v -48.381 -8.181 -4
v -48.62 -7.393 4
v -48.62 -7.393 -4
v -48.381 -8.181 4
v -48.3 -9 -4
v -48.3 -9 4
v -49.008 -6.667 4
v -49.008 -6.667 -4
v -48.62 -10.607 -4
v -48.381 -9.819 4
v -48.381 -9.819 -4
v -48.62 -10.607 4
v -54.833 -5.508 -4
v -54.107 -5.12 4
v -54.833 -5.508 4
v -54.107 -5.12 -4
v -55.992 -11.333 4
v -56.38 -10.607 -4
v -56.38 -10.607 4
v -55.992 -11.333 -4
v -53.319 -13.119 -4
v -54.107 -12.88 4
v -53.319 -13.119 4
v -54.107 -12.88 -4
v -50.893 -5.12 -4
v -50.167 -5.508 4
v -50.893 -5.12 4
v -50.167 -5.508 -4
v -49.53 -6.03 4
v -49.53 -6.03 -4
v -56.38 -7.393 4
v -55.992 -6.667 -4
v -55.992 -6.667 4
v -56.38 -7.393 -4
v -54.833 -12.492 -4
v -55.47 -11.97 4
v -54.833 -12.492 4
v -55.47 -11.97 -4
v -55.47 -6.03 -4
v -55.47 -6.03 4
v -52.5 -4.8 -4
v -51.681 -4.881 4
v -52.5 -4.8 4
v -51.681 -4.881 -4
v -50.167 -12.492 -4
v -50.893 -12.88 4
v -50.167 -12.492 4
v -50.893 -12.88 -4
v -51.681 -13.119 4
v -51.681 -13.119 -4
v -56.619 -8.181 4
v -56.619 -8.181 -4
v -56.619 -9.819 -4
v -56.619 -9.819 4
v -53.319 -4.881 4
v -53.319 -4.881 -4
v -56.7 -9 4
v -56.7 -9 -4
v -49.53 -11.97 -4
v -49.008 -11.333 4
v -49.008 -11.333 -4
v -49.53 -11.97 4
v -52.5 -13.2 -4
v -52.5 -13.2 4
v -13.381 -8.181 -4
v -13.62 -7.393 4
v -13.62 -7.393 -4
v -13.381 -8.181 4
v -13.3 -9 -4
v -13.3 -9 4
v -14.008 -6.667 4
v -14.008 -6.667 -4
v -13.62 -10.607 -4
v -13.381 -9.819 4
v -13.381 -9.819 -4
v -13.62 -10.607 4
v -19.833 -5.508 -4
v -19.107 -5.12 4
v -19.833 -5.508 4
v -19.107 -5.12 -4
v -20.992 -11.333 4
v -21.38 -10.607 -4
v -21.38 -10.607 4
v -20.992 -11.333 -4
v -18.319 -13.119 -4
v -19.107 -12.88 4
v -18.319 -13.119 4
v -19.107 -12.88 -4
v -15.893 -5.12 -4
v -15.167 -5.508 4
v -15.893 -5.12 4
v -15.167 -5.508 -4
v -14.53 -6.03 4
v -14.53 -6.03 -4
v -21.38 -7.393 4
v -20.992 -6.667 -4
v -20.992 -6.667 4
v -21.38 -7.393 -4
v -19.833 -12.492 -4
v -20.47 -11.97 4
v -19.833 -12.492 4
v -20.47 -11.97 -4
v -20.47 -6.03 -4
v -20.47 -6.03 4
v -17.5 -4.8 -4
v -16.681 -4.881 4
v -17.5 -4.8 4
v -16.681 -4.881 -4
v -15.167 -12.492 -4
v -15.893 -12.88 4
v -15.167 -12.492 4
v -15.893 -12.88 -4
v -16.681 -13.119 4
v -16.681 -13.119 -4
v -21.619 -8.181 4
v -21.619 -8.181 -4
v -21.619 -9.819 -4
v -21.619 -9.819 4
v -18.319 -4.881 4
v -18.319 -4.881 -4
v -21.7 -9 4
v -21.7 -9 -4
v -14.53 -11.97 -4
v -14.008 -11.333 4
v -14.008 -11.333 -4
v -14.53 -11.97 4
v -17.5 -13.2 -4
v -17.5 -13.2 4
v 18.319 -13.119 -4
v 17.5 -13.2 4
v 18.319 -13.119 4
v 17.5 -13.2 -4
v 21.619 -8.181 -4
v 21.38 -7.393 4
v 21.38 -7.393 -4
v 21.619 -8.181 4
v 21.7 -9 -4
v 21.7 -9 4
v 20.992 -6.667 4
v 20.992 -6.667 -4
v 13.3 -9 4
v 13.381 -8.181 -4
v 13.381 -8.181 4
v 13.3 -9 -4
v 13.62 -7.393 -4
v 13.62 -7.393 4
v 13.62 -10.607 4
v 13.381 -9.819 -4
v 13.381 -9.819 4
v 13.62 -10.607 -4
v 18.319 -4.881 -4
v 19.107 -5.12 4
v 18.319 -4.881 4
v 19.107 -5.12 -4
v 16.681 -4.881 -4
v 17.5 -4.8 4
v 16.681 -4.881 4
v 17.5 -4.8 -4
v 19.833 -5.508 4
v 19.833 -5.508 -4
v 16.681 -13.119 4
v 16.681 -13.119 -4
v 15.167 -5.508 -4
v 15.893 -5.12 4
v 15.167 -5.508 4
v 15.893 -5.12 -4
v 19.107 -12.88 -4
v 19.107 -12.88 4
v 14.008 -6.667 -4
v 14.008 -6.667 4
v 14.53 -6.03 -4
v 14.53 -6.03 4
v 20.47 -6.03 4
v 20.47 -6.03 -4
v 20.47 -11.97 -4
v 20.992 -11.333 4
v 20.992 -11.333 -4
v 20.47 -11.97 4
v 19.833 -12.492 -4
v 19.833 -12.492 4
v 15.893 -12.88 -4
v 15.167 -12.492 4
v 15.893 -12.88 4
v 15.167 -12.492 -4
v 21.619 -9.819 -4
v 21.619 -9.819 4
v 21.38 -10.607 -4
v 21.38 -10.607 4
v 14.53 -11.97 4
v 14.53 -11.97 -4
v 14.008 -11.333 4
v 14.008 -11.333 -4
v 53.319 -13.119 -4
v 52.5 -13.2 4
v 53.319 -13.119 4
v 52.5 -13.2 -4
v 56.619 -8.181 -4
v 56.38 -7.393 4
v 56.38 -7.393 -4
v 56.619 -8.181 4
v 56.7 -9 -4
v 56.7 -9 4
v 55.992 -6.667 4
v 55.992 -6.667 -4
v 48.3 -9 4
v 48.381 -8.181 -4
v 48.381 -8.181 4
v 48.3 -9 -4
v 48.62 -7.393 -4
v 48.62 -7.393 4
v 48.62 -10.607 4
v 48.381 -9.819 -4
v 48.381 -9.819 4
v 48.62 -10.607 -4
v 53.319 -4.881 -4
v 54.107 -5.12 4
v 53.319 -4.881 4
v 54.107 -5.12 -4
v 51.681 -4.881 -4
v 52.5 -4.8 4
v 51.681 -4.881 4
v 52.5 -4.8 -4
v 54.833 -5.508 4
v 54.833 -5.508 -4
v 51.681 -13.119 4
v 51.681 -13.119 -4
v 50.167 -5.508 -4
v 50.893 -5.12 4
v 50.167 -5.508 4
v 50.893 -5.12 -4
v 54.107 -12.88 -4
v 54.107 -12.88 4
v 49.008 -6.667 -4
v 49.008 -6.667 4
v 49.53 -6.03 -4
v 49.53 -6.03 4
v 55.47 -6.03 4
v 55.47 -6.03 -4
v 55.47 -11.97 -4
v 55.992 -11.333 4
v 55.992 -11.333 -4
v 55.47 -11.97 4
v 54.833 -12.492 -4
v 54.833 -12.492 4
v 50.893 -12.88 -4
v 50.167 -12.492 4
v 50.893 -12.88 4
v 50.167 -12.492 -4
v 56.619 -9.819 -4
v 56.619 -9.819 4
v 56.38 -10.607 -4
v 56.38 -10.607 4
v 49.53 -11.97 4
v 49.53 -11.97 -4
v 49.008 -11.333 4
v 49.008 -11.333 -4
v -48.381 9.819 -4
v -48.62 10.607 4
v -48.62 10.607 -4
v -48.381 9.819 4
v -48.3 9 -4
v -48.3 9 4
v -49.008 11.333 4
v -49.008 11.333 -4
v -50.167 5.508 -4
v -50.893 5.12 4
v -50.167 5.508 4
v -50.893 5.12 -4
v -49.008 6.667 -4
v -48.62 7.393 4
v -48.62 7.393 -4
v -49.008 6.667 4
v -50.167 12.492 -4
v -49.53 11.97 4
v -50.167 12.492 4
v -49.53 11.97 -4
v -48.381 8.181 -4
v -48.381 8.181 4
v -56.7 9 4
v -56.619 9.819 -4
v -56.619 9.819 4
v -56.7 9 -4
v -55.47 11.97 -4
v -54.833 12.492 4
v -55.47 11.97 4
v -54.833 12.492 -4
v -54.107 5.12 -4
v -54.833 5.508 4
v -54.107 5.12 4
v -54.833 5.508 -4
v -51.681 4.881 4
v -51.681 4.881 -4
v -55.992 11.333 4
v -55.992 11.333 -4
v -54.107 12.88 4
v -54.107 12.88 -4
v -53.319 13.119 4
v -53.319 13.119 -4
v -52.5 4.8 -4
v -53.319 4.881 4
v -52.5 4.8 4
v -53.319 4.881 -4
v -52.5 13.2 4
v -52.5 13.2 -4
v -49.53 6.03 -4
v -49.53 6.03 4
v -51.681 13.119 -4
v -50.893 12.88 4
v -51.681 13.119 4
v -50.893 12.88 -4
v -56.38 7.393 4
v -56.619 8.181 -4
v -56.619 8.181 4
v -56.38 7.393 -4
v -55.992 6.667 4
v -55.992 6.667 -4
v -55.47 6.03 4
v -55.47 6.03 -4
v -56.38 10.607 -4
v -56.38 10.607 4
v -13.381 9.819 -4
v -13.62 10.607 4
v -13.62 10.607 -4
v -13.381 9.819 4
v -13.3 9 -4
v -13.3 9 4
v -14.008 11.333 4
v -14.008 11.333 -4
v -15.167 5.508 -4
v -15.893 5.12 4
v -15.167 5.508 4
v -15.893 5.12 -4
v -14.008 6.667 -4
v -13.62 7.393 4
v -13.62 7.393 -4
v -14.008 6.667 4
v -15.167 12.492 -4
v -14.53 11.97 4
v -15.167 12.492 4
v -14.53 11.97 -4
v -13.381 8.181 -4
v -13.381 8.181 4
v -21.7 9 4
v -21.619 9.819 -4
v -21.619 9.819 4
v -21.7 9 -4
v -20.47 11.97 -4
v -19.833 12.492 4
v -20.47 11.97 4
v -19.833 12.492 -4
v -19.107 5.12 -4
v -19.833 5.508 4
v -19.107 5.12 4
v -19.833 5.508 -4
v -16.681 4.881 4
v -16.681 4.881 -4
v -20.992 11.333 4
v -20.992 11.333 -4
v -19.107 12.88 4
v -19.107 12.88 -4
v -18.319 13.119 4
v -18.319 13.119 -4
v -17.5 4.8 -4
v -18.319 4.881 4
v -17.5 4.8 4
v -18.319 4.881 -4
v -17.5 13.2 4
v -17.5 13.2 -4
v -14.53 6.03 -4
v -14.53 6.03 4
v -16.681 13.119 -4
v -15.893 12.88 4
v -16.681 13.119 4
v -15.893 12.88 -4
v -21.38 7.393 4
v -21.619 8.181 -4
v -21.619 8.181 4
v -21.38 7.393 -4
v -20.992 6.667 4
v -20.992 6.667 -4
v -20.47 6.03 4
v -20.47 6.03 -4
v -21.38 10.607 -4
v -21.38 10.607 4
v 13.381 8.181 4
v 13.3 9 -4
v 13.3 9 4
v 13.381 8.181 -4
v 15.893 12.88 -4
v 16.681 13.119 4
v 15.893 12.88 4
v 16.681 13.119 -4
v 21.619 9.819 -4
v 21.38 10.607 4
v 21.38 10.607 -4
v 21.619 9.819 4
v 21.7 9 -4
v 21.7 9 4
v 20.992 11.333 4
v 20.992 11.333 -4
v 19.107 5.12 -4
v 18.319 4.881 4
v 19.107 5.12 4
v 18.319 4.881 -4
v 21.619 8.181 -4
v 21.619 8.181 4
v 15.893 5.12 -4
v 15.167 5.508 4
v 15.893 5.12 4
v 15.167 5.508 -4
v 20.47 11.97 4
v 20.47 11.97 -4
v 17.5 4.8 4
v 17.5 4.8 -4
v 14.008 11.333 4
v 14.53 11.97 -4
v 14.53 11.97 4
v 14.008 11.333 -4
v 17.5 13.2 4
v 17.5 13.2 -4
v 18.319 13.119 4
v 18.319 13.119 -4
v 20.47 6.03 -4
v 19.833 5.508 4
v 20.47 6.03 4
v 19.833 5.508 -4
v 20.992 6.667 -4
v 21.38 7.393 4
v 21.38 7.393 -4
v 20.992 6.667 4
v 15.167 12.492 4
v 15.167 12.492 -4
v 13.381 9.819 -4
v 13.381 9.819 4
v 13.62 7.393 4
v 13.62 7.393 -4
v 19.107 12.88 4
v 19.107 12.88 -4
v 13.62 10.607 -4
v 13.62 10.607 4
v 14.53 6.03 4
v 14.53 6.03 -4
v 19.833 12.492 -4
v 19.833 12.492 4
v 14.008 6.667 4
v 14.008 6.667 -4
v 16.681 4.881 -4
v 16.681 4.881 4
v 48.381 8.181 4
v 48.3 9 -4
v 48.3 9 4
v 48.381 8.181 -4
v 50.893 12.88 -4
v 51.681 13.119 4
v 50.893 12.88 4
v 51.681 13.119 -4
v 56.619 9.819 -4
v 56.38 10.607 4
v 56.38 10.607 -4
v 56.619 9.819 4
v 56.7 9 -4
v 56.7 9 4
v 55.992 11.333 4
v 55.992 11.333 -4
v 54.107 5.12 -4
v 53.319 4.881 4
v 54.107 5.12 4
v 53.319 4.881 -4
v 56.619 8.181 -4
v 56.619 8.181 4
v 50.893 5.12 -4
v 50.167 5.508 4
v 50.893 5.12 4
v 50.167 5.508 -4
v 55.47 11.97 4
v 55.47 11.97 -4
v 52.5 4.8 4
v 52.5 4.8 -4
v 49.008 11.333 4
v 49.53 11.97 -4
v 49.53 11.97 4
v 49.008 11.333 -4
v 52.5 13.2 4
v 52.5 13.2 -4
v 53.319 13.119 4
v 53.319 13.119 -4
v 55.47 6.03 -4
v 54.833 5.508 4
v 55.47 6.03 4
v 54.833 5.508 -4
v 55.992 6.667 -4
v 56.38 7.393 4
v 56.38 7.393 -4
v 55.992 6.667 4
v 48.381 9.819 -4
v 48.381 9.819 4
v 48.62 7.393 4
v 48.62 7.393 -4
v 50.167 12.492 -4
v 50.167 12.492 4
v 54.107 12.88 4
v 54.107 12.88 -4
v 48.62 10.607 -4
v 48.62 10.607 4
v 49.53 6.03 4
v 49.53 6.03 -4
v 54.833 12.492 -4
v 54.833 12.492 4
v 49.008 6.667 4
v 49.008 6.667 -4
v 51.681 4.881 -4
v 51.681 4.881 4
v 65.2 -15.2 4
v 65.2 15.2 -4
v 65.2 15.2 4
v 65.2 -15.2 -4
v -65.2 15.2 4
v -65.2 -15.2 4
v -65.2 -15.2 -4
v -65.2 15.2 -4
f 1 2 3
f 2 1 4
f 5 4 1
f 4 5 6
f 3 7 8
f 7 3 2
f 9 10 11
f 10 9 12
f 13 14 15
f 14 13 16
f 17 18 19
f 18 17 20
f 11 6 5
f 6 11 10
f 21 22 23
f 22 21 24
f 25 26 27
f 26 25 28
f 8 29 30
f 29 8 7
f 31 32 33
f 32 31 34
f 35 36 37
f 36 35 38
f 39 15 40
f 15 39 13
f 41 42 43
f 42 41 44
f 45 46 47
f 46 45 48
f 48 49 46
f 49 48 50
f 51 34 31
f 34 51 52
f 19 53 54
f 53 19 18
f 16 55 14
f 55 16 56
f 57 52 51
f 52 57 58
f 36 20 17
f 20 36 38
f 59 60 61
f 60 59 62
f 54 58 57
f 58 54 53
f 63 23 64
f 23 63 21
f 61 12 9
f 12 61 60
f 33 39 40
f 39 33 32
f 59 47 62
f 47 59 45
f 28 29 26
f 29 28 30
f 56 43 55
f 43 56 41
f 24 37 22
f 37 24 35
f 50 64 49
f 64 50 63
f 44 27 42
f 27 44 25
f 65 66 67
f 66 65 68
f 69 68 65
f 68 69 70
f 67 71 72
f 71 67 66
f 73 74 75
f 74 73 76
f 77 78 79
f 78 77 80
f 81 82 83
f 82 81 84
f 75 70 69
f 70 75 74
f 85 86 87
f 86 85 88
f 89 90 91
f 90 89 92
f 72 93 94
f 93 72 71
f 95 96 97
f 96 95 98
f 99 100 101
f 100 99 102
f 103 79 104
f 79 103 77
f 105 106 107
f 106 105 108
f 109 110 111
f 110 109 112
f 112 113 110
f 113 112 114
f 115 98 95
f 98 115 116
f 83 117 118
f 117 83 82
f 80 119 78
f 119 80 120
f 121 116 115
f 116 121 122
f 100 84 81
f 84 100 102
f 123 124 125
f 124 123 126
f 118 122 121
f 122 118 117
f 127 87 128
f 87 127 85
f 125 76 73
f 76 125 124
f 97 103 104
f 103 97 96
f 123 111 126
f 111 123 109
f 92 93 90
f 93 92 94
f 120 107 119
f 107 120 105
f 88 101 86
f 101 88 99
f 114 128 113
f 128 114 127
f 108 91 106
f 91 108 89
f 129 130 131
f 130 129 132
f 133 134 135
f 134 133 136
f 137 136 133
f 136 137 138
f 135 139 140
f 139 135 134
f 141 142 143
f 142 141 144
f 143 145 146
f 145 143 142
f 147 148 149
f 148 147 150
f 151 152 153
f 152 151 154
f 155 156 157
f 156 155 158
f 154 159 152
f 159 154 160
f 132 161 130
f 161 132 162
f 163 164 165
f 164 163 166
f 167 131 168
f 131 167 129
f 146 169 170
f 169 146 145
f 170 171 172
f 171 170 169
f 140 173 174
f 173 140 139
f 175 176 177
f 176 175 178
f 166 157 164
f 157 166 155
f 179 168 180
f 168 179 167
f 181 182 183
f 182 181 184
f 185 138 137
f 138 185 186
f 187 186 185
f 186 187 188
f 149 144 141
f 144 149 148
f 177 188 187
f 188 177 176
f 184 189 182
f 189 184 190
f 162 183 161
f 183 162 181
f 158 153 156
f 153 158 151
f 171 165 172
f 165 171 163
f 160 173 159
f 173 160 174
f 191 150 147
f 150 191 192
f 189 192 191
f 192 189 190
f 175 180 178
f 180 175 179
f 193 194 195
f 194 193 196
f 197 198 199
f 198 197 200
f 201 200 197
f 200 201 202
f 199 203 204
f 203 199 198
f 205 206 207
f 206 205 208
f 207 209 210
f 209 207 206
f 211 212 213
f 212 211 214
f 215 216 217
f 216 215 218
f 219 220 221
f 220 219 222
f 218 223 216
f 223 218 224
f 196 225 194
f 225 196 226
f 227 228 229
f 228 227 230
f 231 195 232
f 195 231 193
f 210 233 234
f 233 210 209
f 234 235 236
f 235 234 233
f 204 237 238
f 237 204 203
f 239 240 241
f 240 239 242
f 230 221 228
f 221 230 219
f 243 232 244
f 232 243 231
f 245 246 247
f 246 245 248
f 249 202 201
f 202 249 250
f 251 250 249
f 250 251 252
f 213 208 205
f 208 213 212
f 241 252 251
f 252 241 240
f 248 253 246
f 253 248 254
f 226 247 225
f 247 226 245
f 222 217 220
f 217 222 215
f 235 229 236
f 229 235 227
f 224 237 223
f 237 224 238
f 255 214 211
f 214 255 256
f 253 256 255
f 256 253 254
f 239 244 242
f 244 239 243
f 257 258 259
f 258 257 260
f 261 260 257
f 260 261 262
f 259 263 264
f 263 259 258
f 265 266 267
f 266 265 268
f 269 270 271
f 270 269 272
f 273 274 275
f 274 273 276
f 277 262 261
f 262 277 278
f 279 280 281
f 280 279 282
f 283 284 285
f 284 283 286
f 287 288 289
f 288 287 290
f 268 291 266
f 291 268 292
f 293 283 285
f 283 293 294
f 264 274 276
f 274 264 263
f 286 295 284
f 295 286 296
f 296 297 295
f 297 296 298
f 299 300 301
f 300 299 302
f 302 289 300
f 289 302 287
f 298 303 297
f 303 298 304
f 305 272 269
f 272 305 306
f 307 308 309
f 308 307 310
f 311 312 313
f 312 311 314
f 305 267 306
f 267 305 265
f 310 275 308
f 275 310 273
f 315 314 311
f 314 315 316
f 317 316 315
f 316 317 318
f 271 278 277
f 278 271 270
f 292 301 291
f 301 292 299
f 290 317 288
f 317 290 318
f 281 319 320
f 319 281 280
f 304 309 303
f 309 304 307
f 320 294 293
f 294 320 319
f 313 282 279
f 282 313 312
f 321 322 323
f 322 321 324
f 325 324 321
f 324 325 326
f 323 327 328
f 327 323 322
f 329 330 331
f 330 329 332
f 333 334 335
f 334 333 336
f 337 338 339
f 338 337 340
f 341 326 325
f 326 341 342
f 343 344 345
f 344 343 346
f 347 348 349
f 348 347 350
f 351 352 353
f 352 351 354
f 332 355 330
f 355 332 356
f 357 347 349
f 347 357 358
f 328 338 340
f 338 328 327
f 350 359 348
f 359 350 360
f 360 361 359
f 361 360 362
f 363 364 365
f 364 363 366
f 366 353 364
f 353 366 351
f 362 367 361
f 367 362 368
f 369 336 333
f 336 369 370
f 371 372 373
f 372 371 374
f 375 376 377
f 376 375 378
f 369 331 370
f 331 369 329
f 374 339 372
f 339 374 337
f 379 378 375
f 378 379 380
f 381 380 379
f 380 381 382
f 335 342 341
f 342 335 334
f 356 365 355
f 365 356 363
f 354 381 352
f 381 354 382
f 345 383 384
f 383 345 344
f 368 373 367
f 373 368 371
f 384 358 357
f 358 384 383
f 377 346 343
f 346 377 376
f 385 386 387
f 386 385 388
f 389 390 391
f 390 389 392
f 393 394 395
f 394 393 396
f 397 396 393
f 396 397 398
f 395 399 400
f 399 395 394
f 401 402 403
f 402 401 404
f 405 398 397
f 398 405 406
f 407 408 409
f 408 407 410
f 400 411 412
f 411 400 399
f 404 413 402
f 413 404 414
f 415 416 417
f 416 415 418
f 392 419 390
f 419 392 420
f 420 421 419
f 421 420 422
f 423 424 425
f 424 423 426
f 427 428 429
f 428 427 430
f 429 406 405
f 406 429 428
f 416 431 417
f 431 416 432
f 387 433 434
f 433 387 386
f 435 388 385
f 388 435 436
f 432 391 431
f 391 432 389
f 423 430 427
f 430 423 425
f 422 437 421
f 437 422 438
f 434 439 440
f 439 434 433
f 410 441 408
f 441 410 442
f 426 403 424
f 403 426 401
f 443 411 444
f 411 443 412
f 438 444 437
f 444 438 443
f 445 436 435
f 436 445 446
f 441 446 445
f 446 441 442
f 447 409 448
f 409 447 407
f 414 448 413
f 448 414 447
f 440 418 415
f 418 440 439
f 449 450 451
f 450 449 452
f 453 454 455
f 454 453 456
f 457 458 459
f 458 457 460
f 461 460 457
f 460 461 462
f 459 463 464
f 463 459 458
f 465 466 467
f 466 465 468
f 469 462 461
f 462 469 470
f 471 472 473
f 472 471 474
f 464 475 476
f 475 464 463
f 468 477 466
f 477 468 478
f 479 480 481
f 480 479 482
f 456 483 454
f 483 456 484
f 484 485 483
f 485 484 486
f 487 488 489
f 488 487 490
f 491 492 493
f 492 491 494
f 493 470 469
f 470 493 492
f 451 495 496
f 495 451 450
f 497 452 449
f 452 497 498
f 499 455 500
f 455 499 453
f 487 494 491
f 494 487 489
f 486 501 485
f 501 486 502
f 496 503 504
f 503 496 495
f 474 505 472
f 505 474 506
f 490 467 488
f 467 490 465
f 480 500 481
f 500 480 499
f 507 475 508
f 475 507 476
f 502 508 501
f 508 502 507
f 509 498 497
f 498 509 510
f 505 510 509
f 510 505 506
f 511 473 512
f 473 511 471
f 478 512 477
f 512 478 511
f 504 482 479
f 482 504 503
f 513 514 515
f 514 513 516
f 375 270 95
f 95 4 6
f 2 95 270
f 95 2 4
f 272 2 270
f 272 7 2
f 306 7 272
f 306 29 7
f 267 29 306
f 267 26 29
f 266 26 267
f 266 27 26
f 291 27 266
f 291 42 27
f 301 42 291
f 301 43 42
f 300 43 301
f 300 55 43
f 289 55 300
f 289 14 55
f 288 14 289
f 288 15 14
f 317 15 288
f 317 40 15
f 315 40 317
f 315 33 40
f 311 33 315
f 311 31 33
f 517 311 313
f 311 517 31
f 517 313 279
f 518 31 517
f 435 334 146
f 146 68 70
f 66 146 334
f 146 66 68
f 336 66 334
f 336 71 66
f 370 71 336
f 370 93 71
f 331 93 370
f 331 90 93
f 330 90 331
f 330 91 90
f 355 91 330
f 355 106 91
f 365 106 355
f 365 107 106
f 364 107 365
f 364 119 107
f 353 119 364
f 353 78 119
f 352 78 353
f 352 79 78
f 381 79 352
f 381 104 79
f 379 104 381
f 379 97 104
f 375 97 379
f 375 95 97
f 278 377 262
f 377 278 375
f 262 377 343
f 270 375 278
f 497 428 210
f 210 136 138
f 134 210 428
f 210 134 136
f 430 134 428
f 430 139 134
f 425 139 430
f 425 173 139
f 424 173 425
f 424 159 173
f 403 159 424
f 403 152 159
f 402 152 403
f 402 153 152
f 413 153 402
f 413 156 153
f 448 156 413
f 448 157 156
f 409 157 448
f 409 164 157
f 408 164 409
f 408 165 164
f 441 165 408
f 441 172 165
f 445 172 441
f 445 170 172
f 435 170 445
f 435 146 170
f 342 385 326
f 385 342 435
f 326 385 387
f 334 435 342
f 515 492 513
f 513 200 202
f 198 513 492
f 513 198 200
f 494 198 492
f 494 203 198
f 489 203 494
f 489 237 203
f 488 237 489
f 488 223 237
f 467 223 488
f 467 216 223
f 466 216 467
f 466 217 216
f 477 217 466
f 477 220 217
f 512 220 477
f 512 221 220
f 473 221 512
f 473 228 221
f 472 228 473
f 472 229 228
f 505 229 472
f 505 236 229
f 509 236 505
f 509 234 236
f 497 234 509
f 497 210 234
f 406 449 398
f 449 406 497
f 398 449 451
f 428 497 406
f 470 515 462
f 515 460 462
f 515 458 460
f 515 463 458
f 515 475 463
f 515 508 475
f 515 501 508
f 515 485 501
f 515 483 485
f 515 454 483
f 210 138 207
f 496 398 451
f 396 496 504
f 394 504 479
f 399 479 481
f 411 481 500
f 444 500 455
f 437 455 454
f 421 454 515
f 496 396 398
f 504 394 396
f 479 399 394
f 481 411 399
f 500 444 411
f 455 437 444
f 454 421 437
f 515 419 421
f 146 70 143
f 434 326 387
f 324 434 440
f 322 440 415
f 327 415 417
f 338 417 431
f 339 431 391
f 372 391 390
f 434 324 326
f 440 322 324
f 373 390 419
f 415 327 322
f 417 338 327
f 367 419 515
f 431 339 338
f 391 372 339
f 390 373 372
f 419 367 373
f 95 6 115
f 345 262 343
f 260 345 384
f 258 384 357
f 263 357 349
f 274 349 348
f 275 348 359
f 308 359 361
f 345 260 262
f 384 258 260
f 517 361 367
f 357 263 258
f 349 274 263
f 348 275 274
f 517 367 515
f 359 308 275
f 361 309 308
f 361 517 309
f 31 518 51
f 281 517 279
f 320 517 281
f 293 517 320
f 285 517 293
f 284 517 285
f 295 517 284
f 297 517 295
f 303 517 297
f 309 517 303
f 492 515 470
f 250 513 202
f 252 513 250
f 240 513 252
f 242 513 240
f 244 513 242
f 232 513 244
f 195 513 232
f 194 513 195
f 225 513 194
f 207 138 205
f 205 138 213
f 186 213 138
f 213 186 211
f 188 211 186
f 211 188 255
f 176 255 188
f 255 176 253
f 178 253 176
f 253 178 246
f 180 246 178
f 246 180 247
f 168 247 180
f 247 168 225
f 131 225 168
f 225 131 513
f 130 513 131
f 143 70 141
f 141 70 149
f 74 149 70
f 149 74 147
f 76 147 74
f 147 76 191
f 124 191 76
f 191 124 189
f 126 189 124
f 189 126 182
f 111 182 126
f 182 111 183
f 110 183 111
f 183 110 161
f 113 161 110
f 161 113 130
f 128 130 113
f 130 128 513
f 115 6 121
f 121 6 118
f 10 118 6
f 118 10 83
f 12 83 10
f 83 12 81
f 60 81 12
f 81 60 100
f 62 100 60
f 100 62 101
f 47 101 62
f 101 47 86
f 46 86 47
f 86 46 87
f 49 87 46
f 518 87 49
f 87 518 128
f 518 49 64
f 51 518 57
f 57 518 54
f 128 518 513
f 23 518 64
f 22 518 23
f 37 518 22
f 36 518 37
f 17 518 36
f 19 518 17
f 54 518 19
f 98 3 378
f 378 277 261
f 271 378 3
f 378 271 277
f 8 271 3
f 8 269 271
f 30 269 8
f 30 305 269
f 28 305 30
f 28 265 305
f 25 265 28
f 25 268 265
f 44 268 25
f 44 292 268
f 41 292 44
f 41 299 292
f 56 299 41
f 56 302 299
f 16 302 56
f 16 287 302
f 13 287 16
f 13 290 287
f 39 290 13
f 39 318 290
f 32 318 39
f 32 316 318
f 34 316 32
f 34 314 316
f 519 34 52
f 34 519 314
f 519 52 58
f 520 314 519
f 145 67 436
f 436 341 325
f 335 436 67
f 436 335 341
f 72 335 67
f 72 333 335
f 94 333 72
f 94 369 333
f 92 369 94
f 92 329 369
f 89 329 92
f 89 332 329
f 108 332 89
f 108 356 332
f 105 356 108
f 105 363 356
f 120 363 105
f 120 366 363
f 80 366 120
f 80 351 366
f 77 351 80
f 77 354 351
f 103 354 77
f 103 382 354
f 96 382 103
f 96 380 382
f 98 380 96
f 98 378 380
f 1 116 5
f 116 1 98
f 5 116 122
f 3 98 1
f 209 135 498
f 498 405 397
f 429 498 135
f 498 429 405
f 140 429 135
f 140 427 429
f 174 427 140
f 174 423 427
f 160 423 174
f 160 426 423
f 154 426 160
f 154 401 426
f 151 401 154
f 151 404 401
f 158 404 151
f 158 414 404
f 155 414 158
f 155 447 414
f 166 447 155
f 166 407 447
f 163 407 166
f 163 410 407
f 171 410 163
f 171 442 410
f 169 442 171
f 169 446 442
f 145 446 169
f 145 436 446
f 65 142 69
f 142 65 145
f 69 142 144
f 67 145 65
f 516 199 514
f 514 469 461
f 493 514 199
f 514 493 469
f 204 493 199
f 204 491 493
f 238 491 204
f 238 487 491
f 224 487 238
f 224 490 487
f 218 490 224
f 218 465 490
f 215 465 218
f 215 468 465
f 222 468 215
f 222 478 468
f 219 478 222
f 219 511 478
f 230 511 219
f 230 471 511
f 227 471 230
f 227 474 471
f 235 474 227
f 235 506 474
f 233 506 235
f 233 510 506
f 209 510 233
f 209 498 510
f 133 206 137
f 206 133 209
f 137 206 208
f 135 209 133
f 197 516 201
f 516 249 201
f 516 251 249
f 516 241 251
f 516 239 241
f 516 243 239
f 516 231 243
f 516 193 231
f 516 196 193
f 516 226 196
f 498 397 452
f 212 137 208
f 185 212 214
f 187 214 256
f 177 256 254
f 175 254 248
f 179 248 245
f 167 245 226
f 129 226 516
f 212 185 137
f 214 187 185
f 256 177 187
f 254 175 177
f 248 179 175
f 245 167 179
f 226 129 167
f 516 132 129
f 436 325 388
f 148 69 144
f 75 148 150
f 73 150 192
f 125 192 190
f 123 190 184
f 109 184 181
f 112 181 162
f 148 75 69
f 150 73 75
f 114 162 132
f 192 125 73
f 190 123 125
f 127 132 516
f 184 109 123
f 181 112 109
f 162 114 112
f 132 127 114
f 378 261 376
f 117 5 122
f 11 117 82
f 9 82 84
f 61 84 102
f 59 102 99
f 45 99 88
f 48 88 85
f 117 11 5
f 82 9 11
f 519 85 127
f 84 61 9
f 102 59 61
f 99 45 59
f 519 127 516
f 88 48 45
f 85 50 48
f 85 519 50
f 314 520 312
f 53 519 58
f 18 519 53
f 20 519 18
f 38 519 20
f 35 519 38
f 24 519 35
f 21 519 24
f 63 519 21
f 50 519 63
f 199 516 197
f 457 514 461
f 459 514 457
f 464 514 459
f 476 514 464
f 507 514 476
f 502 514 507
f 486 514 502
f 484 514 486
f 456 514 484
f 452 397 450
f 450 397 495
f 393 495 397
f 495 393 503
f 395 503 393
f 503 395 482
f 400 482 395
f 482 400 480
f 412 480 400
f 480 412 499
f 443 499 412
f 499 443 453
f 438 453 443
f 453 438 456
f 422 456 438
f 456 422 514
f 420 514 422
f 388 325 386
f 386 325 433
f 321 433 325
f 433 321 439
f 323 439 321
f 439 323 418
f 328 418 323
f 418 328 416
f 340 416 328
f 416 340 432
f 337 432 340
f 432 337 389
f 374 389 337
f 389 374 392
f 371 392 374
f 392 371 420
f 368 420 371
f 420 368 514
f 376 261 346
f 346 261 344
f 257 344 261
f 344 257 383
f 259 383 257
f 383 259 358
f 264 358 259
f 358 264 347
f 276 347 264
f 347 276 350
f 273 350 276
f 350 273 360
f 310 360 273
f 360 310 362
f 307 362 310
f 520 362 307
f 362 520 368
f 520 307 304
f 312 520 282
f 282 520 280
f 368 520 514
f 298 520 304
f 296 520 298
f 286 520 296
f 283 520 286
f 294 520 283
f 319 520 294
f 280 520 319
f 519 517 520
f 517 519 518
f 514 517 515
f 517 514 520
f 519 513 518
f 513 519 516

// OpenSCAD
$fn = 32;

// ----------------------------------------------------------------------
// Hole bar, 4 x Ø8.4
// tworows layout, 12.7 mm edge offset
// ----------------------------------------------------------------------

// --- parameters (mm) ---
bar_w = 30.4;     // bar width (Y)
bar_t = 8;        // bar thickness (Z)
holes = 4;        // holes per row
hole_d = 8.4;     // hole diameter
edge = 12.7;      // offset from the bar end to the first hole
pitch = 35;       // pitch between neighbouring holes
row_offset = 18;  // distance between the two rows

// --- derived feature positions (mm) ---
span = (holes - 1) * pitch;   // = 105   distance between the end holes
bar_l = span + 2 * edge;      // = 130.4   overall bar length
start_x = -bar_l / 2 + edge;  // = -52.5   X of the first hole
feature_centers = [
  [start_x + 0 * pitch, -row_offset / 2],
  [start_x + 1 * pitch, -row_offset / 2],
  [start_x + 2 * pitch, -row_offset / 2],
  [start_x + 3 * pitch, -row_offset / 2]
];   // hole centres of the first row
row2_centers = [
  [start_x + 0 * pitch, row_offset / 2],
  [start_x + 1 * pitch, row_offset / 2],
  [start_x + 2 * pitch, row_offset / 2],
  [start_x + 3 * pitch, row_offset / 2]
];   // hole centres of the second row

// bar with two rows of holes, both read from their own centre arrays
difference() {
  translate([-bar_l / 2, -bar_w / 2, -bar_t / 2]) cube([bar_l, bar_w, bar_t]);
  for (centre = feature_centers)
    translate([centre[0], centre[1], 0])
      cylinder(d = hole_d, h = bar_t + 2, center = true);
  for (centre = row2_centers)
    translate([centre[0], centre[1], 0])
      cylinder(d = hole_d, h = bar_t + 2, center = true);
}
